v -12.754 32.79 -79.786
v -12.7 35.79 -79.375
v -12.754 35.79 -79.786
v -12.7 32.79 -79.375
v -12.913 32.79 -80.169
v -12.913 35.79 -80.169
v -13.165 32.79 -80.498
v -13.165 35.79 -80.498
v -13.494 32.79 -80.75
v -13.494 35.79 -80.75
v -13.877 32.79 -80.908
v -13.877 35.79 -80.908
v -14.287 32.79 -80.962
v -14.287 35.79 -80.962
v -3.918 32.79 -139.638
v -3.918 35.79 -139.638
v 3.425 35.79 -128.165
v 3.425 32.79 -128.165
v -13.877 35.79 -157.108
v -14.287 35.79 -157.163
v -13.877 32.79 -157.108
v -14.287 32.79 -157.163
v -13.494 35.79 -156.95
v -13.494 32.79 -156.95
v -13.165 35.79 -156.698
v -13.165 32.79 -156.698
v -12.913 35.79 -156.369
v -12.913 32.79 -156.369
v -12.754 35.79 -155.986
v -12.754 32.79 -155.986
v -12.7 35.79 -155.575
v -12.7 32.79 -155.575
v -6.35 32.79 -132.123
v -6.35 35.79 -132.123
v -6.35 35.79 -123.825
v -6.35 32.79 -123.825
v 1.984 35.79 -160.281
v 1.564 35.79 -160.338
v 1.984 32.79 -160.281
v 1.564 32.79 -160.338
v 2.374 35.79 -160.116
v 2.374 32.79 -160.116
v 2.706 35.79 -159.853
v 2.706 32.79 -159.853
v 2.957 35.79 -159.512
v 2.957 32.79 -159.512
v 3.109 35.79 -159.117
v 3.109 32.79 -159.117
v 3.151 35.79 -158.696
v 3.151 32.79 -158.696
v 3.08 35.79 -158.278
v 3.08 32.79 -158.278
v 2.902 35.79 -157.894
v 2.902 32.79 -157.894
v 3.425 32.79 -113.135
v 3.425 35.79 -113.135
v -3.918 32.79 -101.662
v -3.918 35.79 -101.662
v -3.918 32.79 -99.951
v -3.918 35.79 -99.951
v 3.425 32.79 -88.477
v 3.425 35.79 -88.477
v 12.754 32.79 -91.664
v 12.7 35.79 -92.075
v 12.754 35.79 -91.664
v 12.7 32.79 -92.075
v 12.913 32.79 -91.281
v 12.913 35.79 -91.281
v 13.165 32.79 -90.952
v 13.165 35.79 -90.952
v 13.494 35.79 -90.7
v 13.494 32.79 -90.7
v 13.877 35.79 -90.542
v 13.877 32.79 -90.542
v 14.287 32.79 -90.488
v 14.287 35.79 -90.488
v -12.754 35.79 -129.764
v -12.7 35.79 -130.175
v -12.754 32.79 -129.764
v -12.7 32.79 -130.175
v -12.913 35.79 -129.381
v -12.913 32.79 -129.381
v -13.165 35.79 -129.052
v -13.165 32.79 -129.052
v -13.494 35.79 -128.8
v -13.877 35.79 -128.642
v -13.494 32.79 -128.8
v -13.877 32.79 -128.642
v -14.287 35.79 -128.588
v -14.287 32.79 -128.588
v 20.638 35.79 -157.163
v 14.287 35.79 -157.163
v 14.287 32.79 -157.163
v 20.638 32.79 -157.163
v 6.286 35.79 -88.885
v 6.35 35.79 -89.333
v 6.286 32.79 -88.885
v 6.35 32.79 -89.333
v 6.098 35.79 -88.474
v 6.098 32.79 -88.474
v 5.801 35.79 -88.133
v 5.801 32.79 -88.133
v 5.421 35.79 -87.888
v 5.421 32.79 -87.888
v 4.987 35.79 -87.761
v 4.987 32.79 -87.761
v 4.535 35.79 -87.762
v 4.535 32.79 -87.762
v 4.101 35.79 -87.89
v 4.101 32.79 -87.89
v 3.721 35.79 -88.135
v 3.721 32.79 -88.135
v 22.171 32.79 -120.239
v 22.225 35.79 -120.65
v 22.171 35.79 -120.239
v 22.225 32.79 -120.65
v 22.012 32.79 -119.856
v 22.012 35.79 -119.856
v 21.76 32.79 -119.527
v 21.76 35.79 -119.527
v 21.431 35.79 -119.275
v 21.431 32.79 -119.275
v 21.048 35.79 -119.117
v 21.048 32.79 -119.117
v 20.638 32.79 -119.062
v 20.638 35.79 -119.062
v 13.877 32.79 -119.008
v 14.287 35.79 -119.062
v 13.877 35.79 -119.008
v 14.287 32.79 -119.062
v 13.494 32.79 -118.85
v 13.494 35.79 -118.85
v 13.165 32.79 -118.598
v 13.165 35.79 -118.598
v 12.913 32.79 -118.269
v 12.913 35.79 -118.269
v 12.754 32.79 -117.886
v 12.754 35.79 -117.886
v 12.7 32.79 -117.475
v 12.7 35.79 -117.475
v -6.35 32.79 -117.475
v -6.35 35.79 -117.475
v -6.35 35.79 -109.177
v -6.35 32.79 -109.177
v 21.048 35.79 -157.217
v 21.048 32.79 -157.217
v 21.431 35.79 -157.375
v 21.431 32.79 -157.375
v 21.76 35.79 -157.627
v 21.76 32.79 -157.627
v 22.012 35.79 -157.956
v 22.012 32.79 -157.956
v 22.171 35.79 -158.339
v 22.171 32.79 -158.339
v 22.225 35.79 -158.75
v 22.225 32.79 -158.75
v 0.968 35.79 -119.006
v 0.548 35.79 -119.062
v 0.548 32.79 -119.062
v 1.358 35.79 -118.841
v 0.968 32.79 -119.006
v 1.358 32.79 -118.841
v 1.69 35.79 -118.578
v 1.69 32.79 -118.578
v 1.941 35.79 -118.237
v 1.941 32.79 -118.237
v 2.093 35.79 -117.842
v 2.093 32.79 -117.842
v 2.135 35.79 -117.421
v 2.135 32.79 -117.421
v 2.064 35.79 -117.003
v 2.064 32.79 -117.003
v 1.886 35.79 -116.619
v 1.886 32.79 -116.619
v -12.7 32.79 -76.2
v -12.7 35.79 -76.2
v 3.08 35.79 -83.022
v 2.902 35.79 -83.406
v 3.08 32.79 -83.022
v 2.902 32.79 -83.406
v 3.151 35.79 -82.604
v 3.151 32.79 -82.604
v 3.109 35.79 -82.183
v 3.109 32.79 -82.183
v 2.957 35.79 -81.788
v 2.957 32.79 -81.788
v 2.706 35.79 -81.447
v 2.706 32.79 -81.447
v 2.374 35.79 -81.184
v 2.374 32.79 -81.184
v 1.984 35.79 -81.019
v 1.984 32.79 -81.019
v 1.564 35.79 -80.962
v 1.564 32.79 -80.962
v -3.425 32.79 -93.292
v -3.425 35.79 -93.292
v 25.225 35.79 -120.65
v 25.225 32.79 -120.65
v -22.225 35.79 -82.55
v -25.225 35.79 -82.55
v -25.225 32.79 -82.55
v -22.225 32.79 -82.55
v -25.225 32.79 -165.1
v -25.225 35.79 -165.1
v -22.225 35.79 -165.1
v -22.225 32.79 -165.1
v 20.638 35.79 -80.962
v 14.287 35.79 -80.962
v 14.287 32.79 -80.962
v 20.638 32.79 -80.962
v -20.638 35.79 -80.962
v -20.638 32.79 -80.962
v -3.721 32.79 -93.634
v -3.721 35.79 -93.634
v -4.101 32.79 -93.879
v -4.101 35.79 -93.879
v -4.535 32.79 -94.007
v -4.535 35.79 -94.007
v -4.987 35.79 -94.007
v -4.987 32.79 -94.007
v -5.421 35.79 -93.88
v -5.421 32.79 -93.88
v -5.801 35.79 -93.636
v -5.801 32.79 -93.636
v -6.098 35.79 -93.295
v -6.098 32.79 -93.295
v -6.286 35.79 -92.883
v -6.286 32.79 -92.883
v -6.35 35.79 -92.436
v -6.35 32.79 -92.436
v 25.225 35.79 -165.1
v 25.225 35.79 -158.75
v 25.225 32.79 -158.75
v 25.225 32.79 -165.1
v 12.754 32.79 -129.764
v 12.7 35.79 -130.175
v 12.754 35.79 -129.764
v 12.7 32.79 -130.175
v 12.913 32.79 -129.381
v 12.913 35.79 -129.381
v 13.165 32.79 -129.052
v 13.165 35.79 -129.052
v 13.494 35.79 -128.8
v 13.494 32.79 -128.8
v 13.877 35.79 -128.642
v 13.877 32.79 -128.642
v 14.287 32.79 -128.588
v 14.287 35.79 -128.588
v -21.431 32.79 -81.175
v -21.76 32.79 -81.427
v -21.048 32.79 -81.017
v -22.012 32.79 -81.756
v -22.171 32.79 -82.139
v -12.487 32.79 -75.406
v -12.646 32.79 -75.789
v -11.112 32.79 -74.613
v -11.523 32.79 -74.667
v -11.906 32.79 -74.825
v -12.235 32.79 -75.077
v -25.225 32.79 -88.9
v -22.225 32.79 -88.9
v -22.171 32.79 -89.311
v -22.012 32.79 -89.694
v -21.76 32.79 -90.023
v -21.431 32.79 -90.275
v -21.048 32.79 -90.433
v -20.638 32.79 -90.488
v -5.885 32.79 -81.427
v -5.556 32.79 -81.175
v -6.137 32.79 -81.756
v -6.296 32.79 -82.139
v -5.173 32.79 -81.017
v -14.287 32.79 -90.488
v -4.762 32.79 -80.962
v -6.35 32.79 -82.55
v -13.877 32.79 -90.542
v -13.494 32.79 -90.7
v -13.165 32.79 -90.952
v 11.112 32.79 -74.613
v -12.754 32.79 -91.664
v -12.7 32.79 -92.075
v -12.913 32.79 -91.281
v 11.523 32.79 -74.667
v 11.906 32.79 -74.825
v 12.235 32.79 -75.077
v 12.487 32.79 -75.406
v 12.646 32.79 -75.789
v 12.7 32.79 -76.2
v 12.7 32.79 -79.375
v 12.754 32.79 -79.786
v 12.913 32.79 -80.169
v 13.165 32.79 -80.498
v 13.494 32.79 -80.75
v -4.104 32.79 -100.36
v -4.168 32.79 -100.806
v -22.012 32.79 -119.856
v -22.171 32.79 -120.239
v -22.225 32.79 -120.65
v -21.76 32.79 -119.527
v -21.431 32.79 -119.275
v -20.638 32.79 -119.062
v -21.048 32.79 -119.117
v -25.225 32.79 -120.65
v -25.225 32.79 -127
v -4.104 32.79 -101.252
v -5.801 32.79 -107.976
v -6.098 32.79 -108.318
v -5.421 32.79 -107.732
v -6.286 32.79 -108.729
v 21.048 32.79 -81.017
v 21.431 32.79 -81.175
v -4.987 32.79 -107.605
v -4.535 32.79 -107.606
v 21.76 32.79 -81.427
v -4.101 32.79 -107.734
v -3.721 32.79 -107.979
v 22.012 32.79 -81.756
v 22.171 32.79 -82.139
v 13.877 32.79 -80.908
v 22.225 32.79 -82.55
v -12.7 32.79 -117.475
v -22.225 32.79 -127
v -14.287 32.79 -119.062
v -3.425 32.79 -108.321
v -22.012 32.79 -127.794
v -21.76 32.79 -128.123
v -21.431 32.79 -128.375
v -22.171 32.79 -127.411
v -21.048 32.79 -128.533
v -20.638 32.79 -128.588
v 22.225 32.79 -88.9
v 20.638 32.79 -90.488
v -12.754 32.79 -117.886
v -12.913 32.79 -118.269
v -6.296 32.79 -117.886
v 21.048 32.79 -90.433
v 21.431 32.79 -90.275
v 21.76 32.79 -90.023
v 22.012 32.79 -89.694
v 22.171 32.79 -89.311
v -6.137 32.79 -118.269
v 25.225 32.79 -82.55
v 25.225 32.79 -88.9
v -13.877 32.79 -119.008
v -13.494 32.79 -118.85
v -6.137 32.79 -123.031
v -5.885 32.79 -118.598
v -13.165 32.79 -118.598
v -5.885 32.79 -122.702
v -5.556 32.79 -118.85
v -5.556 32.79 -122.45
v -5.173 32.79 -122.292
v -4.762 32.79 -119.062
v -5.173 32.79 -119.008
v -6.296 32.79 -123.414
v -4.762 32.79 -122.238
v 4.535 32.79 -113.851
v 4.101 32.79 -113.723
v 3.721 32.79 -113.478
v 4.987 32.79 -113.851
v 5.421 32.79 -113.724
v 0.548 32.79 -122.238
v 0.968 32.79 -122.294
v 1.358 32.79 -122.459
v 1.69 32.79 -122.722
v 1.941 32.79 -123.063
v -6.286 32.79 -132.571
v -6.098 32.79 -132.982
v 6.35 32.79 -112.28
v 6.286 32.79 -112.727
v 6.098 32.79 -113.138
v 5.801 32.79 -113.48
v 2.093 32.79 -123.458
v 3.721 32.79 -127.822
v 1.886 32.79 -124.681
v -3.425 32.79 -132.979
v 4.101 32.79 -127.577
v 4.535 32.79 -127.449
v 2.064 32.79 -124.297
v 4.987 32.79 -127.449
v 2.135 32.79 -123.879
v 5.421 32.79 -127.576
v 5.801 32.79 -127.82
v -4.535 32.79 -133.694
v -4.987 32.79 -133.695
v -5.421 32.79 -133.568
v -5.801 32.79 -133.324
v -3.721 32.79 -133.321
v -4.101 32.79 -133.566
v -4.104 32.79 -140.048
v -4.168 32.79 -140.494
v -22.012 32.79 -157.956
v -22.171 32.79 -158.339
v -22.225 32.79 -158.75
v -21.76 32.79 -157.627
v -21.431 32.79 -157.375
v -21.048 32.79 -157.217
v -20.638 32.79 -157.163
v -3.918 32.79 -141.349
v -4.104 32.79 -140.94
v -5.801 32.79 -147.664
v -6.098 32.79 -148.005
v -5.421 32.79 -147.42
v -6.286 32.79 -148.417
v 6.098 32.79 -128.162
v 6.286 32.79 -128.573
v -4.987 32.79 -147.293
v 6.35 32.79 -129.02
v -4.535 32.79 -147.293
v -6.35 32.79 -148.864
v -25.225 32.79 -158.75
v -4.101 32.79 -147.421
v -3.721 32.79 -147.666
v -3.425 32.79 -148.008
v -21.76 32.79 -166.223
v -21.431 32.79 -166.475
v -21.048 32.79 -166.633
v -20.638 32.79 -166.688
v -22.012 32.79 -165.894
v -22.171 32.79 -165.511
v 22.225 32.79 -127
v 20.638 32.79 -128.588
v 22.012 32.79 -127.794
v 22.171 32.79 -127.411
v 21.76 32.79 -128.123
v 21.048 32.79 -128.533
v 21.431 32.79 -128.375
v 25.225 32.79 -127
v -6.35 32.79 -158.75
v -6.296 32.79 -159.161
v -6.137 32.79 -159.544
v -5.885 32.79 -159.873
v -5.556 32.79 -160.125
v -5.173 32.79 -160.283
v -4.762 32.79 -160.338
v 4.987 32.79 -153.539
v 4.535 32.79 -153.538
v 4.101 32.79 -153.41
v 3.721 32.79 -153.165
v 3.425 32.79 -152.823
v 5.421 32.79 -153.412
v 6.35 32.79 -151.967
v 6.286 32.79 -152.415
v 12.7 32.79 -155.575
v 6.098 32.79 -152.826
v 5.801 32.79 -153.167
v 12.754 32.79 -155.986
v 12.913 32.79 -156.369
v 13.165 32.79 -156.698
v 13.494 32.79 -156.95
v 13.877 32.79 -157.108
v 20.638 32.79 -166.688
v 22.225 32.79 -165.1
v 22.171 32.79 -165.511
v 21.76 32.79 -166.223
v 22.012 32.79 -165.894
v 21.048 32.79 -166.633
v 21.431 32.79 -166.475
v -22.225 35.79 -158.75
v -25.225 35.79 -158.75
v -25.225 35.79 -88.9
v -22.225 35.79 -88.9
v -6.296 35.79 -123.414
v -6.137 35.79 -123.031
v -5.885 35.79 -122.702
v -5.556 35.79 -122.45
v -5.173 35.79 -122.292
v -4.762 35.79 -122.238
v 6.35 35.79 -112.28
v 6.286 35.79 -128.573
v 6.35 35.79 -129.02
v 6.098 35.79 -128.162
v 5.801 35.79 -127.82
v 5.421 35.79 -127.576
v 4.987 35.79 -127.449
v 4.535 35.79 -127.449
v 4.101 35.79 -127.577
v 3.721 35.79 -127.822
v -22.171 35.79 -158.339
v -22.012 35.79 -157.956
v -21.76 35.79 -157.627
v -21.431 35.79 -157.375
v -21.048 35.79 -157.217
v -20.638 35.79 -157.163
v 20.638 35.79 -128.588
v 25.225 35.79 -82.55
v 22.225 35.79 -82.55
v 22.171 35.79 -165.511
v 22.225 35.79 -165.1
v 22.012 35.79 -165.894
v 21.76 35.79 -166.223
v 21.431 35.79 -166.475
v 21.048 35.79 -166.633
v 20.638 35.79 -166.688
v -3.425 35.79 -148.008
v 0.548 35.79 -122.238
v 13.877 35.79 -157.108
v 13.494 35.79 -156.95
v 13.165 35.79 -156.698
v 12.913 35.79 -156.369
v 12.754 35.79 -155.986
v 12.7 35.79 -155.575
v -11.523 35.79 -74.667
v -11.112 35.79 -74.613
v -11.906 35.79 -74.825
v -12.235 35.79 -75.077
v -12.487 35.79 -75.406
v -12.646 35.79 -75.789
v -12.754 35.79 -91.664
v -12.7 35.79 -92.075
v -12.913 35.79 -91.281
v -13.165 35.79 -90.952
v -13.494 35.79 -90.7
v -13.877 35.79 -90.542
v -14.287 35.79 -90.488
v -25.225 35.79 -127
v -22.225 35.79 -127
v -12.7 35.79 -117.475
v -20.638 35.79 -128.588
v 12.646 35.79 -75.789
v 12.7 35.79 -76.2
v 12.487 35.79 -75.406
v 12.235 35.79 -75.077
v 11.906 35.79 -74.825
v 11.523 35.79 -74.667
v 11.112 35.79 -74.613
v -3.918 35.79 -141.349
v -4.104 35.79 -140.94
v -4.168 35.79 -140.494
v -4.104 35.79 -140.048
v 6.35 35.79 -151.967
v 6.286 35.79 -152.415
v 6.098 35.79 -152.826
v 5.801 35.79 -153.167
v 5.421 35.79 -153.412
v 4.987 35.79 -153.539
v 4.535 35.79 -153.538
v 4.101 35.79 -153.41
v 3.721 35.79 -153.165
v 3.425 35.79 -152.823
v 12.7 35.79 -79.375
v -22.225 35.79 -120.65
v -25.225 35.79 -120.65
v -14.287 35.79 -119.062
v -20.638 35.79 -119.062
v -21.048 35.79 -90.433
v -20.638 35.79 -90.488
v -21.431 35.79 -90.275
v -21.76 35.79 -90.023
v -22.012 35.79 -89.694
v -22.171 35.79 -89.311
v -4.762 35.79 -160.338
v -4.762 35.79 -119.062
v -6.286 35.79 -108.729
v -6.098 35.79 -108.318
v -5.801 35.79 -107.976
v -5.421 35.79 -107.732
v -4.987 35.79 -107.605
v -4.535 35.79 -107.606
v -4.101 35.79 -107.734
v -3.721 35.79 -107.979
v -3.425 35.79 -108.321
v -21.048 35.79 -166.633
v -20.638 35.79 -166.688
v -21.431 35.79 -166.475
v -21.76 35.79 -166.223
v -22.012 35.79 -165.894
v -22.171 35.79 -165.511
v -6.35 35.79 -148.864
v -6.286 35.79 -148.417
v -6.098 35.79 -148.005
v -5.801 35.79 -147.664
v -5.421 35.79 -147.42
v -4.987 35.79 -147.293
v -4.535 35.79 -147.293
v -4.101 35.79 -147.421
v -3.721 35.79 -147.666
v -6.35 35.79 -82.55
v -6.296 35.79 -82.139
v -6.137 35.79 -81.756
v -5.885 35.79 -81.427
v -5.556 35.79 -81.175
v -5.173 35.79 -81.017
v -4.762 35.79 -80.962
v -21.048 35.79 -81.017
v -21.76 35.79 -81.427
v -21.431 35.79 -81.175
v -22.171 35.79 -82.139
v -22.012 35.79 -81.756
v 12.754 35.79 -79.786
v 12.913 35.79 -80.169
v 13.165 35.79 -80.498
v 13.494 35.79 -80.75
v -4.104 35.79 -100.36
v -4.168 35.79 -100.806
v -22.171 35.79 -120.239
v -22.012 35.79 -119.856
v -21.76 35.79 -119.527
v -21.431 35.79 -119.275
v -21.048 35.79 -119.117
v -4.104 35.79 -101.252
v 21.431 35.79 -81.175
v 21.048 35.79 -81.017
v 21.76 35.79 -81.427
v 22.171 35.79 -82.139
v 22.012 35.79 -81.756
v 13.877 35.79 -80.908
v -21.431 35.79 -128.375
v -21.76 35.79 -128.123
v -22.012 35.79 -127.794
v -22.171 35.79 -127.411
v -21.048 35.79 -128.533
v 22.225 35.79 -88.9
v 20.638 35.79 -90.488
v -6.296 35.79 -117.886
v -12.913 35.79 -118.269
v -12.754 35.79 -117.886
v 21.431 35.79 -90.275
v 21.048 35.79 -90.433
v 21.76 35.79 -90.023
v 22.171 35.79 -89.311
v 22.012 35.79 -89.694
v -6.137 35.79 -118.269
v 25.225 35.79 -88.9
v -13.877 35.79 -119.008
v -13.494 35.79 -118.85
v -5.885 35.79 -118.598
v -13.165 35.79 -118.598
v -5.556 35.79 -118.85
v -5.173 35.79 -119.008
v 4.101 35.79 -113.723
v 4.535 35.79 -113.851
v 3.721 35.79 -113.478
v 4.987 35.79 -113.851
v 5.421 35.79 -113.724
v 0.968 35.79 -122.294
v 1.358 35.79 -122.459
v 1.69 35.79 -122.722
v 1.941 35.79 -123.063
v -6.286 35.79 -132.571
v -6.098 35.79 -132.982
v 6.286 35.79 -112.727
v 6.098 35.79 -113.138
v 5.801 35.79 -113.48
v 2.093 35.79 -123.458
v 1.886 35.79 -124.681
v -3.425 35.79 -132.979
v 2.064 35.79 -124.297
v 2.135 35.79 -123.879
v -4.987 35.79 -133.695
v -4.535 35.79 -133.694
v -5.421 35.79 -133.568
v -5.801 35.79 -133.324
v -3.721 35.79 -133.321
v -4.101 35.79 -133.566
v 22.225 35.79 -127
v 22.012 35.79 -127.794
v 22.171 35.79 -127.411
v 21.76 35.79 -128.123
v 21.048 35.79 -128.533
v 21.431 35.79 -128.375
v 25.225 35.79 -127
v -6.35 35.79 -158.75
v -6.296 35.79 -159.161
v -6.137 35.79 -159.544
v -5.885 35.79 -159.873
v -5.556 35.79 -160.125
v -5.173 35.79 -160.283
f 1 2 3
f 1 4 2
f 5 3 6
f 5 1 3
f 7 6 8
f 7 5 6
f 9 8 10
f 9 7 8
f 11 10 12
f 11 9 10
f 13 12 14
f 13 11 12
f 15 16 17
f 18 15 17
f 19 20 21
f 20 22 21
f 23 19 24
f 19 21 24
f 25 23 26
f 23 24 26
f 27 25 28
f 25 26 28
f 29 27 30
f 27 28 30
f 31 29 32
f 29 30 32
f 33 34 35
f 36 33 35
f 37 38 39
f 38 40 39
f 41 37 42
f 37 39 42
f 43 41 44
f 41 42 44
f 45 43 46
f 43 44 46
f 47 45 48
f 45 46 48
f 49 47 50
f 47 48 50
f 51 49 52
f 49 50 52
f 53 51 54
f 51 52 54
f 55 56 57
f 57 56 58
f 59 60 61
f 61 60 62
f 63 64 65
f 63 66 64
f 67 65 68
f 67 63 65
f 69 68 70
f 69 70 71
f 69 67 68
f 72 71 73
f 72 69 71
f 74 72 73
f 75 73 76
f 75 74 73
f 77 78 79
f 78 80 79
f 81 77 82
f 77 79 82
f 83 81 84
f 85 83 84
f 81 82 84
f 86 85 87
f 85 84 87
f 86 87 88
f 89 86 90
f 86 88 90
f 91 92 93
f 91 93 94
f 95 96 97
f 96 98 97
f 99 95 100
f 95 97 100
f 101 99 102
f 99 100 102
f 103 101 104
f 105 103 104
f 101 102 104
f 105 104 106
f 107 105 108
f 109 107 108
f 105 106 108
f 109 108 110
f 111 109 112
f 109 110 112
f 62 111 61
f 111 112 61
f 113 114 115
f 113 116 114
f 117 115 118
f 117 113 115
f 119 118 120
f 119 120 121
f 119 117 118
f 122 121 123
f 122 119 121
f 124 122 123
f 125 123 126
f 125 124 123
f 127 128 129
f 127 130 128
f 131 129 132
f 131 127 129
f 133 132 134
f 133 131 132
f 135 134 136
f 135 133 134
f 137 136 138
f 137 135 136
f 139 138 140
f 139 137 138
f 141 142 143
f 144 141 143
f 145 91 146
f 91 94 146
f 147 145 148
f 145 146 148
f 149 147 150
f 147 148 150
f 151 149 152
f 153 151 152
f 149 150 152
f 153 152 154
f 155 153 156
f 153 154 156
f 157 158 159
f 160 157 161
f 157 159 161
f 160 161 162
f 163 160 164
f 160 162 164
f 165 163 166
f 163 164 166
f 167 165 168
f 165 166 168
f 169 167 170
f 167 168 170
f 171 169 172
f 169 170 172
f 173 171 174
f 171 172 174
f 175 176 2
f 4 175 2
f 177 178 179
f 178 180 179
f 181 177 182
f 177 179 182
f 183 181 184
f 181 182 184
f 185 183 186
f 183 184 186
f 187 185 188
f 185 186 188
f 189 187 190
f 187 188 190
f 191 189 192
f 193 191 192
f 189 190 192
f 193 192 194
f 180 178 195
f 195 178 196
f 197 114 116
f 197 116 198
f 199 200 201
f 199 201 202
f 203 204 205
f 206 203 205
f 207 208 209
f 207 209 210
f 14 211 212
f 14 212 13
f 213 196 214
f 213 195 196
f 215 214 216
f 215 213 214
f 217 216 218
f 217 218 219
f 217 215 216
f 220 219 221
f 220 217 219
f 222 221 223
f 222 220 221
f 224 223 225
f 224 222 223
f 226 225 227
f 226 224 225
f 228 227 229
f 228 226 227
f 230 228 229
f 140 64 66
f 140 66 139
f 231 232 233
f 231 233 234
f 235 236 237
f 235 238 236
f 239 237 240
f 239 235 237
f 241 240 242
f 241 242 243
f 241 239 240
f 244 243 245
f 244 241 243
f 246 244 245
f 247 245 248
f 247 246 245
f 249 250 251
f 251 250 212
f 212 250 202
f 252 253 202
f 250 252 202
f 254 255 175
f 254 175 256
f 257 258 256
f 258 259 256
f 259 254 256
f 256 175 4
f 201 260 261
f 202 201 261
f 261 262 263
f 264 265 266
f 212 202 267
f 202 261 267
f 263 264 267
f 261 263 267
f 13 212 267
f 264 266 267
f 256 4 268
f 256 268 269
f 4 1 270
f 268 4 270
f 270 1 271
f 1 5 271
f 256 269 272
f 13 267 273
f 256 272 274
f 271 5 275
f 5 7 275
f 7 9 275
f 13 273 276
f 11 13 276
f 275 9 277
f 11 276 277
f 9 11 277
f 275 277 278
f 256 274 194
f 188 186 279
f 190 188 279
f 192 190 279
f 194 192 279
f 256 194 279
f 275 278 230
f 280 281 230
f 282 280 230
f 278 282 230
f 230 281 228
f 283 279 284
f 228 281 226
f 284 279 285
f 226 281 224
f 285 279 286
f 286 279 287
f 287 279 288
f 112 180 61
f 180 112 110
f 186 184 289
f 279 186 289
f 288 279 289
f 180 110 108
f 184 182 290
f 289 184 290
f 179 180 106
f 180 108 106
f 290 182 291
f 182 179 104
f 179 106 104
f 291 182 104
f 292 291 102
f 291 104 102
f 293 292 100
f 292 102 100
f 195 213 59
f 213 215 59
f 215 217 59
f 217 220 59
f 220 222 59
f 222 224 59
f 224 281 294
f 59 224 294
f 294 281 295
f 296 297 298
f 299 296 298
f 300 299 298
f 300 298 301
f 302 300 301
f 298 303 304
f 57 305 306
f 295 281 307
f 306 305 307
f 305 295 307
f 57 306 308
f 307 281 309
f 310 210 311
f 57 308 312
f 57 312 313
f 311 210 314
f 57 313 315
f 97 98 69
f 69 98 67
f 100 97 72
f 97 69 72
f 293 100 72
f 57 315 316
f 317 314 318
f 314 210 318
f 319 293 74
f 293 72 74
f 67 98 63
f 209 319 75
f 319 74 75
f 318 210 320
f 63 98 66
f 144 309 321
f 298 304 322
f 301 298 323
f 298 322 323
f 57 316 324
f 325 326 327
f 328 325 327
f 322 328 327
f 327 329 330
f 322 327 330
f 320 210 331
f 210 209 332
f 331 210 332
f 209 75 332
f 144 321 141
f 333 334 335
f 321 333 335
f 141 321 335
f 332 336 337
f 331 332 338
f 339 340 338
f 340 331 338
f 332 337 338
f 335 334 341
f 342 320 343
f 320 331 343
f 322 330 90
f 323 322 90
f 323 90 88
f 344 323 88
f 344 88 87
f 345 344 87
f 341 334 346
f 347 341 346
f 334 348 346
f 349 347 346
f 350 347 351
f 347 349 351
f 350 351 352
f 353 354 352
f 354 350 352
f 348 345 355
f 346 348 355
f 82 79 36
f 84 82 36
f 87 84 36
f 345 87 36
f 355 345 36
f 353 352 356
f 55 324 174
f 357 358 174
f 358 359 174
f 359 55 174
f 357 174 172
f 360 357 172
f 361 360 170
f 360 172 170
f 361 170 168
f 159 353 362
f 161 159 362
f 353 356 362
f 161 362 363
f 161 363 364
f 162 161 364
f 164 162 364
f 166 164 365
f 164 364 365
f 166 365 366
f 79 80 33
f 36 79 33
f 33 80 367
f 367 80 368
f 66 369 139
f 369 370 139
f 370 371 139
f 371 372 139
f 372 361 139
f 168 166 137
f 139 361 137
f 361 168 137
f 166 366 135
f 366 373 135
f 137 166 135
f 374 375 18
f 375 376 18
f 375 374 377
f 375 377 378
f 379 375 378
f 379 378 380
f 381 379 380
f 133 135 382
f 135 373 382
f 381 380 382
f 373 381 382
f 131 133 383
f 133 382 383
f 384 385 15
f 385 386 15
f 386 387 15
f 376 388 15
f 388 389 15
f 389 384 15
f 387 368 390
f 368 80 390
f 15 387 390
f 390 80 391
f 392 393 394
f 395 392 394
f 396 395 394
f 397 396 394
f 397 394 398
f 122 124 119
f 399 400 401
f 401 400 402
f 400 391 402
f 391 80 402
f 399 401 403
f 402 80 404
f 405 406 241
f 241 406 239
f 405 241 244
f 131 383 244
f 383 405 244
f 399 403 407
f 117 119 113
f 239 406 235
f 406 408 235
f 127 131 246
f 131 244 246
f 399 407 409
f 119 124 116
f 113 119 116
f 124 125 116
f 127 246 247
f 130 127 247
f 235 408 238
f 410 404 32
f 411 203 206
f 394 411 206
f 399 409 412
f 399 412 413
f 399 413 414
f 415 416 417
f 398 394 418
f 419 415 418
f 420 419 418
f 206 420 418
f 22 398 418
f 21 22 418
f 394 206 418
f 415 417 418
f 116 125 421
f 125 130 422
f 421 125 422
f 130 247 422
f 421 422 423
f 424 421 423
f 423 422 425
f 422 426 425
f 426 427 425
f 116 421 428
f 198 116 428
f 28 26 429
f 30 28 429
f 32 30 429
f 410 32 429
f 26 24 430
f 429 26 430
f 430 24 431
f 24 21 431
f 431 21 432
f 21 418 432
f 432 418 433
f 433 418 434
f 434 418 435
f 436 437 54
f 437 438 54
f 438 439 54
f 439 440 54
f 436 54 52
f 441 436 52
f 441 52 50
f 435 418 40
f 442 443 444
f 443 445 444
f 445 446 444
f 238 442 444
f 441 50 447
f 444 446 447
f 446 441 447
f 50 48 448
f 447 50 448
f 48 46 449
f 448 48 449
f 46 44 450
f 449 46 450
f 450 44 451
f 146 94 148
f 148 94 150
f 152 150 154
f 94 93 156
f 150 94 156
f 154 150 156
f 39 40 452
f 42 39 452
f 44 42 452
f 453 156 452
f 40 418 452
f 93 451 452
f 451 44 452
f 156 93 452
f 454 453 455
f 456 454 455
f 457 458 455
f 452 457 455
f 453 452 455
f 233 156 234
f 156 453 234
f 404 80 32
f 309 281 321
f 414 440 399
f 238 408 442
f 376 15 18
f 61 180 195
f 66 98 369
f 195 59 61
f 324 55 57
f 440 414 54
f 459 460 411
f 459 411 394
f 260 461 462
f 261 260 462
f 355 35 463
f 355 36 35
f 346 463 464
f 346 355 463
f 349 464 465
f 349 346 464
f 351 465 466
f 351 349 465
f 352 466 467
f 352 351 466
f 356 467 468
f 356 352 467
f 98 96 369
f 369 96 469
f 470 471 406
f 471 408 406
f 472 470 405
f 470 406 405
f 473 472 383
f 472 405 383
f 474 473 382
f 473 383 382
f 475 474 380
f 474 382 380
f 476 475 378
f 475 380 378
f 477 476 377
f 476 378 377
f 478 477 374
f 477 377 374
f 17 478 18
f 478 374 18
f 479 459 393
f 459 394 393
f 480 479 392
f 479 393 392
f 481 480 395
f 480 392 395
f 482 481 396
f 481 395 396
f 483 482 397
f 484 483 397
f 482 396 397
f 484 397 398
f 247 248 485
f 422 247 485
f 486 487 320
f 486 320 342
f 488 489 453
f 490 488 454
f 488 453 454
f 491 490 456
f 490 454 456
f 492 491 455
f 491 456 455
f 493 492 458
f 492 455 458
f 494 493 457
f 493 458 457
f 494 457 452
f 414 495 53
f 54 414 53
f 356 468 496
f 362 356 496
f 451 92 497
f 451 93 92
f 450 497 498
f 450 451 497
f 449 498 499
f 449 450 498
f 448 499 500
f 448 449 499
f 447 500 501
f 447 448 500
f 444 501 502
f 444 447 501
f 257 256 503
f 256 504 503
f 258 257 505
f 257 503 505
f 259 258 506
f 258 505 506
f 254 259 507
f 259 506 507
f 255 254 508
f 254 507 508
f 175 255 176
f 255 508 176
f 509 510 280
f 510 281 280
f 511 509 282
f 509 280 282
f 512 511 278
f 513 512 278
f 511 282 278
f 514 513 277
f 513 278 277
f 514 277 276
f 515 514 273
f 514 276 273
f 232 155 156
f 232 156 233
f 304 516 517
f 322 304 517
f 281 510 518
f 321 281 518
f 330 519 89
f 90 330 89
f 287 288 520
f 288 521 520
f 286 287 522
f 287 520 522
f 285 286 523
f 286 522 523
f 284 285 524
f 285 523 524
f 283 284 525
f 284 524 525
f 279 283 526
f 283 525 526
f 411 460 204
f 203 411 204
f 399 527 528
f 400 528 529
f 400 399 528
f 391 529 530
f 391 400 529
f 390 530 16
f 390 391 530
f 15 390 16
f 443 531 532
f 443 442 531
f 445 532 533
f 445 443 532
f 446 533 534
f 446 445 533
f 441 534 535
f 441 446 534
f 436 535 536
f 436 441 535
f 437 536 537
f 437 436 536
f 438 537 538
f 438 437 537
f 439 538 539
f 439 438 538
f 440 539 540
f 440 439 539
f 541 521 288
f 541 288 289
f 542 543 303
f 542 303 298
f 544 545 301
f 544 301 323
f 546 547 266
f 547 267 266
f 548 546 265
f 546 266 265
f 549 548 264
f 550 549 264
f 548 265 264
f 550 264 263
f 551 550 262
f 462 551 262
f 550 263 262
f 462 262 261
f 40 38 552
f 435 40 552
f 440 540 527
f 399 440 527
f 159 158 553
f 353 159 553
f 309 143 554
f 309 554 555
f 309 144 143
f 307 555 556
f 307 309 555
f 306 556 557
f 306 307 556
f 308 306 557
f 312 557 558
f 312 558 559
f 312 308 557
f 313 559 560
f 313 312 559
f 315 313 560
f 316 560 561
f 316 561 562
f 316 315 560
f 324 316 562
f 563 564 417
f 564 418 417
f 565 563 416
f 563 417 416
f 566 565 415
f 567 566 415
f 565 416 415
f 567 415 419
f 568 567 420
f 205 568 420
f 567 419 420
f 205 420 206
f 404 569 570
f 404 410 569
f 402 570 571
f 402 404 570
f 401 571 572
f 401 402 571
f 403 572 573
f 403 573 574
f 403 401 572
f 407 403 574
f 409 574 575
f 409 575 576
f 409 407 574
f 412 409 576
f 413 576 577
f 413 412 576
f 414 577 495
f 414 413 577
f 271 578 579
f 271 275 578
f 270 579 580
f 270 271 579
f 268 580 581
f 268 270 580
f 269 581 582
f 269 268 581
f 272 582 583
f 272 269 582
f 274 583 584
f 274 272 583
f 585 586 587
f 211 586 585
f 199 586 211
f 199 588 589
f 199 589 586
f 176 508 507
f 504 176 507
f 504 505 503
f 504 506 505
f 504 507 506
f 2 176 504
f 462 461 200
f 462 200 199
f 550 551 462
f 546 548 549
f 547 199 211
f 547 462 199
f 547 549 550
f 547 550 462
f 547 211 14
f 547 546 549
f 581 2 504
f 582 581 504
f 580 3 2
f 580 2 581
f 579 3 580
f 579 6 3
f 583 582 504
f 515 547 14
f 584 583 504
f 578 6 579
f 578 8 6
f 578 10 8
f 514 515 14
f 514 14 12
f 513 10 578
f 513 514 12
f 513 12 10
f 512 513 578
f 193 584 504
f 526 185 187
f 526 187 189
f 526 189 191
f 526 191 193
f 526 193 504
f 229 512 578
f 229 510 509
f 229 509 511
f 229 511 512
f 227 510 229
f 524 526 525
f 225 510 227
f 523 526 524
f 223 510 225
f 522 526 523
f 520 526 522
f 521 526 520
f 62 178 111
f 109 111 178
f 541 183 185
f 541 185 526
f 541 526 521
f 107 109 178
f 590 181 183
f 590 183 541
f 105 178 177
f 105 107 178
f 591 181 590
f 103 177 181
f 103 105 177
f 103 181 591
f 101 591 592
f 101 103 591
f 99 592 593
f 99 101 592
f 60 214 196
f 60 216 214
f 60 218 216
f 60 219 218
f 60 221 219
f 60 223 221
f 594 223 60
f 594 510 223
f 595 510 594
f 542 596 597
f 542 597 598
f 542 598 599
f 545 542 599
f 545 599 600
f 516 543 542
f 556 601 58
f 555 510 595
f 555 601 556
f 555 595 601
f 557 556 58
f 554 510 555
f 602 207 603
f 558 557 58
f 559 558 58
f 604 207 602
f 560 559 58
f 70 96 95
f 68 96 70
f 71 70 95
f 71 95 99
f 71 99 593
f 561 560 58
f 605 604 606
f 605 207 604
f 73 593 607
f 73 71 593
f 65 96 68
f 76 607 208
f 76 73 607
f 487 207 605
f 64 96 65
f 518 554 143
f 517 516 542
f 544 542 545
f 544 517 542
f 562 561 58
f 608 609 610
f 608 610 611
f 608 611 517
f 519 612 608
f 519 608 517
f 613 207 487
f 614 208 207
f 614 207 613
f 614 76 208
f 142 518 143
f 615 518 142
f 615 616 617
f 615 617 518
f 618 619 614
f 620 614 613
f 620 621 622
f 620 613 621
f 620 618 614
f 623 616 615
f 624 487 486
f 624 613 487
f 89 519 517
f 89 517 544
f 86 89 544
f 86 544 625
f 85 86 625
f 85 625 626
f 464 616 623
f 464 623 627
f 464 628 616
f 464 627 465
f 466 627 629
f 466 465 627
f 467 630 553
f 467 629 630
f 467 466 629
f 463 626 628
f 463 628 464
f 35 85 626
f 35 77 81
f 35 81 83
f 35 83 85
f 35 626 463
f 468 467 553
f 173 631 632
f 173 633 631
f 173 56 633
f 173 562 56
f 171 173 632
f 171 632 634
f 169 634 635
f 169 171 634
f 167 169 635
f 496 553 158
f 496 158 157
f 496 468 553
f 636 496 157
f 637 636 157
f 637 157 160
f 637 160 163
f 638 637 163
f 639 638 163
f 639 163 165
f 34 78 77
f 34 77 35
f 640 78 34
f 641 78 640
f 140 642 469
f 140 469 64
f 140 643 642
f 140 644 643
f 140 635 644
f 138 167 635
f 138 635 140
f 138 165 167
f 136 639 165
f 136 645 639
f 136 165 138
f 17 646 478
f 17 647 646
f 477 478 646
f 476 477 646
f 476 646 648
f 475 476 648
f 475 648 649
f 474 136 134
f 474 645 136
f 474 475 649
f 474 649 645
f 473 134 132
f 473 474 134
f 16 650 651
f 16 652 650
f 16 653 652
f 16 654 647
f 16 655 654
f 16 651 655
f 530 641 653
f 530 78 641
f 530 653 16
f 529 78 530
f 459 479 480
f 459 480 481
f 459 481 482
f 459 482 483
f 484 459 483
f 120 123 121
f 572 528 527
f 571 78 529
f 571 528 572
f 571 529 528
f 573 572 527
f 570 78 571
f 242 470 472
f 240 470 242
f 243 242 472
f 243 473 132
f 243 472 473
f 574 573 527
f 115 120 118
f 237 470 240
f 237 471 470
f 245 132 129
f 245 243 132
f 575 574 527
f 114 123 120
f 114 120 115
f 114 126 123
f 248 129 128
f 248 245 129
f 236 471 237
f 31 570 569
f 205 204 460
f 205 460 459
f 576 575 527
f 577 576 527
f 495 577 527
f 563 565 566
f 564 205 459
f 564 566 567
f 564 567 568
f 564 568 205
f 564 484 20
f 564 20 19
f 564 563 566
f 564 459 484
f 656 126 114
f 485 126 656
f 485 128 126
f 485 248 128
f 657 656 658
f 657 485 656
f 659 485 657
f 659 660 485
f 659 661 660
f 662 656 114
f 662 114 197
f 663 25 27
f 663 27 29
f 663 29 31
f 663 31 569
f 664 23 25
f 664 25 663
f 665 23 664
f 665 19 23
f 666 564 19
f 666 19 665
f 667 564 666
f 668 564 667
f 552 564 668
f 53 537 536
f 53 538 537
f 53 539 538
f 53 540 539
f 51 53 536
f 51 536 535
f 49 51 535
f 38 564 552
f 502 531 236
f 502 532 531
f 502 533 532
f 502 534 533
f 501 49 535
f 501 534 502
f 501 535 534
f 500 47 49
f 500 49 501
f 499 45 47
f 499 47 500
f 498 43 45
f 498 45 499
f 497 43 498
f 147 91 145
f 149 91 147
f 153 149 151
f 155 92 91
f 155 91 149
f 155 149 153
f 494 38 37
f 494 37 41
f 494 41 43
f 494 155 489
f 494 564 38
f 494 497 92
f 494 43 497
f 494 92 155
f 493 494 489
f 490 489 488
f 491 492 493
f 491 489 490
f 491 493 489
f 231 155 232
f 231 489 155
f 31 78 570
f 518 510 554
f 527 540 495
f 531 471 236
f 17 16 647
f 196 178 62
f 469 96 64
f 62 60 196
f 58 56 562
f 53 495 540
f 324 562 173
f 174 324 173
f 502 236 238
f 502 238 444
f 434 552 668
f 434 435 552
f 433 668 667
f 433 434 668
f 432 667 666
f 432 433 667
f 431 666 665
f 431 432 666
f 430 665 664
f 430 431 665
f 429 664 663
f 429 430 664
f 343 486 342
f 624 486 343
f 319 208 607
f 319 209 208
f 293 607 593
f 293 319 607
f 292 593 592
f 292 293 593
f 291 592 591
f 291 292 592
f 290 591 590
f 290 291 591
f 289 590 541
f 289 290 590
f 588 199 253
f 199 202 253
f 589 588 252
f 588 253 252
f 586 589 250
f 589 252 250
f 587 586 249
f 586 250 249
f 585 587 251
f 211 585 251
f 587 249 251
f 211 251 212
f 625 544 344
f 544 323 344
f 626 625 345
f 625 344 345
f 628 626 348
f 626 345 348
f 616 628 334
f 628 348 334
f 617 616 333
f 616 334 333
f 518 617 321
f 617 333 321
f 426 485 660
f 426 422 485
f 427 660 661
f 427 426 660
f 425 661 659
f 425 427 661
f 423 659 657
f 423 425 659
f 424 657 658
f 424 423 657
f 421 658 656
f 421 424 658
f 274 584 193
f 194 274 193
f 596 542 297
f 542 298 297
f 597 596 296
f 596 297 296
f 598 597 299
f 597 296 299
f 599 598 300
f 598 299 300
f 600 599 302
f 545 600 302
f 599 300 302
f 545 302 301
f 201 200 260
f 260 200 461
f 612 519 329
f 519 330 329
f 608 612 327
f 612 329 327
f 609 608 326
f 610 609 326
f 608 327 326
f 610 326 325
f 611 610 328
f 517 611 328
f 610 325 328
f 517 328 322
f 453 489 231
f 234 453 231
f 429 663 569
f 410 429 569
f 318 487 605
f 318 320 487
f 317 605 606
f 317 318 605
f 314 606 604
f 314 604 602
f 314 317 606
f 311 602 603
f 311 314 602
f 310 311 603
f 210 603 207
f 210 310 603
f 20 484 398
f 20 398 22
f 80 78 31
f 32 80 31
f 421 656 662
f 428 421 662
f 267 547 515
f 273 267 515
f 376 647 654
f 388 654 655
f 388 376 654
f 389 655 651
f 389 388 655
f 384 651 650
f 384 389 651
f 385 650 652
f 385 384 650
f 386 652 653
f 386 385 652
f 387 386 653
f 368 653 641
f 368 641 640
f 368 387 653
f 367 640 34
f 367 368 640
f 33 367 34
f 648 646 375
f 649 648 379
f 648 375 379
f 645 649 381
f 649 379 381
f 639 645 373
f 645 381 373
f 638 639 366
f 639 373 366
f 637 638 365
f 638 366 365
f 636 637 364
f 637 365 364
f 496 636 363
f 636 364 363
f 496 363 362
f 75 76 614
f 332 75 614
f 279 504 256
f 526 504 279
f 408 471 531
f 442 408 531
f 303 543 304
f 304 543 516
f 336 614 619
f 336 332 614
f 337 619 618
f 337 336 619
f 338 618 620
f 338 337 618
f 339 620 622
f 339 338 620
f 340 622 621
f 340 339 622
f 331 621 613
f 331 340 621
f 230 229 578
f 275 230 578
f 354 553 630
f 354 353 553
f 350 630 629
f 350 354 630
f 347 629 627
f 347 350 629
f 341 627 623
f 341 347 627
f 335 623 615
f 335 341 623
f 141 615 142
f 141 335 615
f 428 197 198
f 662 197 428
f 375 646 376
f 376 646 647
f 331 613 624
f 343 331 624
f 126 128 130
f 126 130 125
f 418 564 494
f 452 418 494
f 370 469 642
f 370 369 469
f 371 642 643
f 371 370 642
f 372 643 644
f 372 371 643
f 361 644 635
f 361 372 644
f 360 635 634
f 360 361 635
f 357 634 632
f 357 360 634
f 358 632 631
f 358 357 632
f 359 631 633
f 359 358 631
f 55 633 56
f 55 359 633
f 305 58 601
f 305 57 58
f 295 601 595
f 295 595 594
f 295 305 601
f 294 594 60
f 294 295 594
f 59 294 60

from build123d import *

# Parameters (mm, degrees)
SKETCH1_W           = 25.4
SKETCH1_H           = 92.075
BOSS_EXTRUDE1_DEPTH = 1.5
SKETCH2_W           = 9.525
SKETCH2_H           = 9.525
BOSS_EXTRUDE2_DEPTH = 3
CUT_EXTRUDE1_DEPTH  = 169.189397054
FILLET1_R           = 1.5875
SKETCH5_W           = 3
SKETCH5_H           = 6.35
BOSS_EXTRUDE3_DEPTH = 3


with BuildPart() as part:
    # Sketch1 → Boss-Extrude1 (new, symmetric)
    with BuildSketch(Plane(origin=(0, 34.29, 0), x_dir=(1, 0, 0), z_dir=(0, 1, 0))):
        with Locations((0, 120.65)):
            Rectangle(SKETCH1_W, SKETCH1_H)
    extrude(amount=BOSS_EXTRUDE1_DEPTH, both=True)

    # Sketch2 → Boss-Extrude2 (add)
    with BuildSketch(Plane(origin=(0, 35.79, 0), x_dir=(1, 0, 0), z_dir=(0, 1, 0))):
        with Locations((17.4625, 161.925)):
            Rectangle(SKETCH2_W, SKETCH2_H)
        with Locations((-17.4625, 161.925)):
            Rectangle(SKETCH2_W, SKETCH2_H)
        with Locations((17.4625, 123.825)):
            Rectangle(SKETCH2_W, SKETCH2_H)
        with Locations((-17.4625, 123.825)):
            Rectangle(SKETCH2_W, SKETCH2_H)
        with Locations((17.4625, 85.725)):
            Rectangle(SKETCH2_W, SKETCH2_H)
        with Locations((-17.4625, 85.725)):
            Rectangle(SKETCH2_W, SKETCH2_H)
    extrude(amount=-BOSS_EXTRUDE2_DEPTH)

    # Sketch4 → Cut-Extrude1 (cut, through all)
    with BuildSketch(Plane(origin=(0, 35.79, 0), x_dir=(1, 0, 0), z_dir=(0, 1, 0))):
        Polygon((4.465215596, 80.9625), (-6.35, 97.861274369), (-6.35, 80.9625), align=None)
        Polygon((6.35, 83.907475631), (6.35, 117.705024369), (-4.465215596, 100.80625), align=None)
        Polygon((3.449215596, 119.0625), (-6.35, 119.0625), (-6.35, 103.751225631), align=None)
        Polygon((3.449215596, 122.2375), (-6.35, 137.548774369), (-6.35, 122.2375), align=None)
        Polygon((6.35, 123.594975631), (6.35, 157.392524369), (-4.465215596, 140.49375), align=None)
        Polygon((4.465215596, 160.3375), (-6.35, 160.3375), (-6.35, 143.438725631), align=None)
    extrude(amount=-CUT_EXTRUDE1_DEPTH, mode=Mode.SUBTRACT)

    # Fillet1
    fillet1_edges = [part.edges().sort_by_distance(p)[0] for p in [
        (3.449215596, 34.29, -119.0625),
        (-6.35, 34.29, -103.751225631),
        (-6.35, 34.29, -119.0625),
        (-4.465215596, 34.29, -100.80625),
        (6.35, 34.29, -117.705024369),
        (6.35, 34.29, -83.907475631),
        (-4.465215596, 34.29, -140.49375),
        (6.35, 34.29, -157.392524369),
        (6.35, 34.29, -123.594975631),
        (3.449215596, 34.29, -122.2375),
        (-6.35, 34.29, -122.2375),
        (-6.35, 34.29, -137.548774369),
        (-6.35, 34.29, -143.438725631),
        (-6.35, 34.29, -160.3375),
        (4.465215596, 34.29, -160.3375),
        (4.465215596, 34.29, -80.9625),
        (-6.35, 34.29, -80.9625),
        (-6.35, 34.29, -97.861274369),
        (22.225, 34.29, -80.9625),
        (22.225, 34.29, -90.4875),
        (12.7, 34.29, -90.4875),
        (12.7, 34.29, -80.9625),
        (-12.7, 34.29, -119.0625),
        (-12.7, 34.29, -128.5875),
        (-22.225, 34.29, -128.5875),
        (-22.225, 34.29, -119.0625),
        (22.225, 34.29, -119.0625),
        (22.225, 34.29, -128.5875),
        (12.7, 34.29, -128.5875),
        (12.7, 34.29, -119.0625),
        (-12.7, 34.29, -157.1625),
        (-22.225, 34.29, -166.6875),
        (-22.225, 34.29, -157.1625),
        (-12.7, 34.29, -80.9625),
        (-12.7, 34.29, -90.4875),
        (-22.225, 34.29, -90.4875),
        (-22.225, 34.29, -80.9625),
        (22.225, 34.29, -157.1625),
        (22.225, 34.29, -166.6875),
        (12.7, 34.29, -157.1625),
        (-12.7, 34.29, -74.6125),
        (12.7, 34.29, -74.6125),
    ]]
    fillet(fillet1_edges, radius=FILLET1_R)

    # Sketch5 → Boss-Extrude3 (add)
    with BuildSketch(Plane(origin=(0, 35.79, 0), x_dir=(1, 0, 0), z_dir=(0, 1, 0))):
        with Locations((23.725, 161.925)):
            Rectangle(SKETCH5_W, SKETCH5_H)
        with Locations((-23.725, 161.925)):
            Rectangle(SKETCH5_W, SKETCH5_H)
        with Locations((23.725, 123.825)):
            Rectangle(SKETCH5_W, SKETCH5_H)
        with Locations((-23.725, 123.825)):
            Rectangle(SKETCH5_W, SKETCH5_H)
        with Locations((23.725, 85.725)):
            Rectangle(SKETCH5_W, SKETCH5_H)
        with Locations((-23.725, 85.725)):
            Rectangle(SKETCH5_W, SKETCH5_H)
    extrude(amount=-BOSS_EXTRUDE3_DEPTH)


solid = part.part
